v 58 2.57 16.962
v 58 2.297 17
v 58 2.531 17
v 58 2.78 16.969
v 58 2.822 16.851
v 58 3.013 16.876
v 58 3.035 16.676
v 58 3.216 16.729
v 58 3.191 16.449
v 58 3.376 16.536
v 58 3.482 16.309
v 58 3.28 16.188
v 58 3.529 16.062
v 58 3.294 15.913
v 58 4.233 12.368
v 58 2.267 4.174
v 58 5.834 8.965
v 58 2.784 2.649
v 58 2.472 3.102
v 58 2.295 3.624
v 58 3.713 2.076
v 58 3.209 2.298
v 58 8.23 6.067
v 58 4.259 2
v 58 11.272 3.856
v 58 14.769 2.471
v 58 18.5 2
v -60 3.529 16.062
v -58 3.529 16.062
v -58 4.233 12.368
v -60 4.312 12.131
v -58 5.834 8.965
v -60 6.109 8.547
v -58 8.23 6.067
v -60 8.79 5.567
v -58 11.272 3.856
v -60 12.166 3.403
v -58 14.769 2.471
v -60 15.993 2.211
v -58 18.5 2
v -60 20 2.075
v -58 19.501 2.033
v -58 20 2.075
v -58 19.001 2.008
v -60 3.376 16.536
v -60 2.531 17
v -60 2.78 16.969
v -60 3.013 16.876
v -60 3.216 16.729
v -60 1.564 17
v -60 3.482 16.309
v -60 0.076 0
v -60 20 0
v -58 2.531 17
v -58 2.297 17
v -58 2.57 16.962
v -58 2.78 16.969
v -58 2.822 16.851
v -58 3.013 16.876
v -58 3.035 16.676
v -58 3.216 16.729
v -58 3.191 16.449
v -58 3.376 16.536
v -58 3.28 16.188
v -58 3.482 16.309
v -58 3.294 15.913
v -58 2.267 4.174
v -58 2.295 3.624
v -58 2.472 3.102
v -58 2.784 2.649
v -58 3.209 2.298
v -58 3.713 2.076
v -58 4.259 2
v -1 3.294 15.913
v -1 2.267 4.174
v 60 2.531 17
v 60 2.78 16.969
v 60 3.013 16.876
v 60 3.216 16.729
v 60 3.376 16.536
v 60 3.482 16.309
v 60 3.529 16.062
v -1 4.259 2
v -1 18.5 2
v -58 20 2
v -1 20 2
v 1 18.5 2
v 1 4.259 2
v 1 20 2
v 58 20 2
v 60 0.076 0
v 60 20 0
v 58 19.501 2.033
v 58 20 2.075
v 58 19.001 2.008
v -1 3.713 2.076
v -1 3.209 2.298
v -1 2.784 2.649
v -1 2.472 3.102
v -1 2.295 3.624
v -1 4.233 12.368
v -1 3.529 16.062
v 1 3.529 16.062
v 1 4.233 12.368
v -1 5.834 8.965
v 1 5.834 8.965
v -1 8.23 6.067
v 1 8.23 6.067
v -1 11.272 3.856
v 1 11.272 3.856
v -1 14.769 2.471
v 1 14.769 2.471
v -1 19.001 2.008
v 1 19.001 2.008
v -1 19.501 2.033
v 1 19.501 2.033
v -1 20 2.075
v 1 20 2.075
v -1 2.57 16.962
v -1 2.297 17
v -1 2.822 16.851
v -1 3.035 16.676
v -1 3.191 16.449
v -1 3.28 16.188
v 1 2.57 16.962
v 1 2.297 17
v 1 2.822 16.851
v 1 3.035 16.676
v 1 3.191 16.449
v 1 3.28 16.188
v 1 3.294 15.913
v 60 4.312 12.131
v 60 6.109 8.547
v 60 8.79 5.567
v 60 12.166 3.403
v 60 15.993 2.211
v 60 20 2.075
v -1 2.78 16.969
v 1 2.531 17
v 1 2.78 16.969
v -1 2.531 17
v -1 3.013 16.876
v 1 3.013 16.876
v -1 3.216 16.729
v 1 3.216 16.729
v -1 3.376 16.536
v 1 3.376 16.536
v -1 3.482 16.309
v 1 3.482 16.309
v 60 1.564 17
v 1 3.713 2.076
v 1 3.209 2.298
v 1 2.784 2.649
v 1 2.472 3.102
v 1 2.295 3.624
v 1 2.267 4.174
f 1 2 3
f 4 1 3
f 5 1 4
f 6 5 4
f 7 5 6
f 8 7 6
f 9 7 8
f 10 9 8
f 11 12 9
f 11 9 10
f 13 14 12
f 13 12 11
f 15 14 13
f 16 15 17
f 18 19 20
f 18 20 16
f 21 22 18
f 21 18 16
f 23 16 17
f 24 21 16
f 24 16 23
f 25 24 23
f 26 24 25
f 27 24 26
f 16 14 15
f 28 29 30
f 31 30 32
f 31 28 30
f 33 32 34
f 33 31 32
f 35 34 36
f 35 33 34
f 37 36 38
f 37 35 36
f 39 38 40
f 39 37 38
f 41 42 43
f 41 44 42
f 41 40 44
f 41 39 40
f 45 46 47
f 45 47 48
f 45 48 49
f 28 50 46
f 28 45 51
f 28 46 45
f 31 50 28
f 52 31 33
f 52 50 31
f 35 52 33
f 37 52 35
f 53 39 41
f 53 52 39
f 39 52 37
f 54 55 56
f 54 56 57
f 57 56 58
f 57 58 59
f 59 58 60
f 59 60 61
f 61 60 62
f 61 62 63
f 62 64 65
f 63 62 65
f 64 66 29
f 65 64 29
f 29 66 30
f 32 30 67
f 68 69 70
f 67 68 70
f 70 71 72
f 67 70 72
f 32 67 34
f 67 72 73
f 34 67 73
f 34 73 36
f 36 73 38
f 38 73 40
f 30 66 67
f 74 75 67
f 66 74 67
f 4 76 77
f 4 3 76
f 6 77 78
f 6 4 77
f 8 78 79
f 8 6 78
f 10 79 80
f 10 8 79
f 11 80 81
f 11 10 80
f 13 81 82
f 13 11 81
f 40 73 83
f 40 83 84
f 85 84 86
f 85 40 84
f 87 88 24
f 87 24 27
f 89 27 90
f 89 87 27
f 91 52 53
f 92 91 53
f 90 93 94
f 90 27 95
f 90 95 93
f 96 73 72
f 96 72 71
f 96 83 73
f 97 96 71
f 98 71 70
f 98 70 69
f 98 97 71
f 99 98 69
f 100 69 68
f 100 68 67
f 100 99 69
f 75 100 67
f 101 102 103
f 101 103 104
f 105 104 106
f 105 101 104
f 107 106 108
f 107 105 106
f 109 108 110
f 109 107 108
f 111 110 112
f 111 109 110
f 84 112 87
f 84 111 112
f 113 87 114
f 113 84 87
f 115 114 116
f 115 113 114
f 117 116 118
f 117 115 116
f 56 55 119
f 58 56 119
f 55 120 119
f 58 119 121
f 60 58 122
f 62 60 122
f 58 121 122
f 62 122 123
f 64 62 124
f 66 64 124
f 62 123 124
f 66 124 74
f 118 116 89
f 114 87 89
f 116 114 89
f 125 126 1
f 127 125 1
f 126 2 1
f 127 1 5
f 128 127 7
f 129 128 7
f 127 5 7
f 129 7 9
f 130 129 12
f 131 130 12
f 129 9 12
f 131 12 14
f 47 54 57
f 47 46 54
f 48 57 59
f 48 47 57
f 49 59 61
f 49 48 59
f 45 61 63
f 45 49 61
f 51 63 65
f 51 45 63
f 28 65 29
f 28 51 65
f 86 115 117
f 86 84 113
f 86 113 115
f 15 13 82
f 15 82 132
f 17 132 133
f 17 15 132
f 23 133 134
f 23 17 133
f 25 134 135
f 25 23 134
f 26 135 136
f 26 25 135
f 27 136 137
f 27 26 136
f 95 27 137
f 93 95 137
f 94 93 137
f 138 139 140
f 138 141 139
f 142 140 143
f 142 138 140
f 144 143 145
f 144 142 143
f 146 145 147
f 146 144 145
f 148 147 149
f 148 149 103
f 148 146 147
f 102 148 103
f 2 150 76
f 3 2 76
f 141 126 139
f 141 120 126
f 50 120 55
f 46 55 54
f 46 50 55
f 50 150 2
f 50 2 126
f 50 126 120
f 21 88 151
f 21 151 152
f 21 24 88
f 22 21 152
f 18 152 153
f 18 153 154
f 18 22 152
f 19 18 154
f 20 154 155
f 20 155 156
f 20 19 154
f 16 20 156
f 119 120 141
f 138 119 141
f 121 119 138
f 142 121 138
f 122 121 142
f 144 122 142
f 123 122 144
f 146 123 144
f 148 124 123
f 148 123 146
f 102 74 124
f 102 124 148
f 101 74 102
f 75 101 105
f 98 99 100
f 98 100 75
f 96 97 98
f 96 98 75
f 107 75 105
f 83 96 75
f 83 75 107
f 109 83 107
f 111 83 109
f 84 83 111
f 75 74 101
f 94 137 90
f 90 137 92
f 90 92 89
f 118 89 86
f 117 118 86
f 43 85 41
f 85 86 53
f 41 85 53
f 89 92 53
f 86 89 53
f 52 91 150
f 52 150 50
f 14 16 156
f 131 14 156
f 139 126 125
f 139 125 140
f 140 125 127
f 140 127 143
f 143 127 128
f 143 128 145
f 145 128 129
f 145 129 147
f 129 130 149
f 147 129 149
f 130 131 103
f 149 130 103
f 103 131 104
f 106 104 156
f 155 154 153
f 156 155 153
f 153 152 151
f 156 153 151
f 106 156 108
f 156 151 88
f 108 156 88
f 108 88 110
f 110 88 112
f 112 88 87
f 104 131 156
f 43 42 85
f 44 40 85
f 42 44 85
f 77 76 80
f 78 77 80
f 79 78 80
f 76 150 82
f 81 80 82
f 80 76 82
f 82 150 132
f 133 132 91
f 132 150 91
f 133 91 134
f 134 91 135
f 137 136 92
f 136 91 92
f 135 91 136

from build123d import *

# Parameters (mm, degrees)
BOX006_W                           = 20
BOX006_H                           = 120
BOX006_DEPTH                       = 25
BOX006_PLACEMENT_ANGLE             = 5
BOX002_W                           = 20
BOX002_H                           = 57
BOX002_DEPTH                       = 17
FILLET005002_R                     = 2
BOX008_W                           = 20
BOX008_H                           = 120
BOX008_DEPTH                       = 25
BOX008_PLACEMENT_ANGLE             = 5
BOX007_W                           = 20
BOX007_H                           = 57
BOX007_DEPTH                       = 17
FILLET003001002002_R               = 2
CYLINDER_R                         = 15
CYLINDER_DEPTH                     = 120
BOX005_W                           = 20
BOX005_H                           = 120
BOX005_DEPTH                       = 25
BOX005_PLACEMENT_ANGLE             = 5
BOX004_W                           = 20
BOX004_H                           = 120
BOX004_DEPTH                       = 17
FILLET003001002003_R               = 1
FILLET003001002004_R               = 1
FILLET003001002004_PLACEMENT_ANGLE = 90


with BuildPart() as cube006:
    # Box006 → Box006 (new body)
    with BuildSketch(Plane.XY):
        with Locations((10, 60)):
            Rectangle(BOX006_W, BOX006_H)
    extrude(amount=BOX006_DEPTH)


with BuildPart() as cube006_1:
    # Box006 placement: moved
    add(cube006.part.moved(Location((-20, -60, 0))).rotate(Axis((-20, -60, 0), (0, 1, 0)), BOX006_PLACEMENT_ANGLE))


with BuildPart() as cutout002:
    # Box002 → Box002 (new body)
    with BuildSketch(Plane(origin=(0, -58.5, 0), x_dir=(1, 0, 0), z_dir=(0, 0, 1))):
        with Locations((10, 28.5)):
            Rectangle(BOX002_W, BOX002_H)
    extrude(amount=BOX002_DEPTH)

    # Cut002: cut Cube006
    add(cube006_1.part, mode=Mode.SUBTRACT)

    # Fillet005002
    fillet005002_edges = [cutout002.edges().sort_by_distance(p)[0] for p in [
        (0.076397, -30, 0),
    ]]
    fillet(fillet005002_edges, radius=FILLET005002_R)


with BuildPart() as cutout002_1:
    # Fillet005002 placement: moved
    add(cutout002.part.moved(Location((2, 0.5, 2))))


with BuildPart() as cube008:
    # Box008 → Box008 (new body)
    with BuildSketch(Plane.XY):
        with Locations((10, 60)):
            Rectangle(BOX008_W, BOX008_H)
    extrude(amount=BOX008_DEPTH)


with BuildPart() as cube008_1:
    # Box008 placement: moved
    add(cube008.part.moved(Location((-20, -60, 0))).rotate(Axis((-20, -60, 0), (0, 1, 0)), BOX008_PLACEMENT_ANGLE))


with BuildPart() as fusion:
    # Box007 → Box007 (new body)
    with BuildSketch(Plane(origin=(0, -58.5, 0), x_dir=(1, 0, 0), z_dir=(0, 0, 1))):
        with Locations((10, 28.5)):
            Rectangle(BOX007_W, BOX007_H)
    extrude(amount=BOX007_DEPTH)

    # Cut005: cut Cube008
    add(cube008_1.part, mode=Mode.SUBTRACT)

    # Fillet003001002002
    fillet003001002002_edges = [fusion.edges().sort_by_distance(p)[0] for p in [
        (0.076397, -30, 0),
    ]]
    fillet(fillet003001002002_edges, radius=FILLET003001002002_R)


with BuildPart() as fusion_1:
    # Fillet003001002002 placement: moved
    add(fusion.part.moved(Location((2, 59.5, 2))))

    # Fusion: union Cutout002
    add(cutout002_1.part)


with BuildPart() as cylinder:
    # Cylinder → Cylinder (new body)
    with BuildSketch(Plane(origin=(18.5, 60, 17), x_dir=(1, 0, 0), z_dir=(0, -1, 0))):
        Circle(CYLINDER_R)
    extrude(amount=CYLINDER_DEPTH)


with BuildPart() as cube005:
    # Box005 → Box005 (new body)
    with BuildSketch(Plane.XY):
        with Locations((10, 60)):
            Rectangle(BOX005_W, BOX005_H)
    extrude(amount=BOX005_DEPTH)


with BuildPart() as cube005_1:
    # Box005 placement: moved
    add(cube005.part.moved(Location((-20, -60, 0))).rotate(Axis((-20, -60, 0), (0, 1, 0)), BOX005_PLACEMENT_ANGLE))


with BuildPart() as fillet003001002004:
    # Box004 → Box004 (new body)
    with BuildSketch(Plane(origin=(0, -60, 0), x_dir=(1, 0, 0), z_dir=(0, 0, 1))):
        with Locations((10, 60)):
            Rectangle(BOX004_W, BOX004_H)
    extrude(amount=BOX004_DEPTH)

    # Cut003: cut Cube005
    add(cube005_1.part, mode=Mode.SUBTRACT)

    # Cut004: cut Cylinder
    add(cylinder.part, mode=Mode.SUBTRACT)

    # Cut006: cut Fusion
    add(fusion_1.part, mode=Mode.SUBTRACT)

    # Fillet003001002003
    fillet003001002003_edges = [fillet003001002004.edges().sort_by_distance(p)[0] for p in [
        (3.388727, 29.5, 17),
        (3.388727, -29.5, 17),
    ]]
    fillet(fillet003001002003_edges, radius=FILLET003001002003_R)

    # Fillet003001002004
    fillet003001002004_edges = [fillet003001002004.edges().sort_by_distance(p)[0] for p in [
        (3.5, 59, 17),
        (3.5, -59, 17),
        (3.5, 0, 17),
    ]]
    fillet(fillet003001002004_edges, radius=FILLET003001002004_R)


with BuildPart() as fillet003001002004_1:
    # Fillet003001002004 placement: moved
    add(fillet003001002004.part.rotate(Axis((0, 0, 0), (0, 0, 1)), FILLET003001002004_PLACEMENT_ANGLE))


solid = fillet003001002004_1.part
